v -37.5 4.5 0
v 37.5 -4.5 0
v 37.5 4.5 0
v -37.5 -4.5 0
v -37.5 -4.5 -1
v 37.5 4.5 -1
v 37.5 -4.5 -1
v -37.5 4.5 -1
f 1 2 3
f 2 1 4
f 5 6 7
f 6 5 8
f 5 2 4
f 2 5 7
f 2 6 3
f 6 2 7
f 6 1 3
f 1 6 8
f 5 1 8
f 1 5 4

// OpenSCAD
// Pip-Boy lettering

union() {
  translate([0, 0,-0.5])
    cube([75.0,9,1.0], center=true);
  translate([0,0,-0.1])
        scale([.14, .14, 0.01])
          surface(file = "pip-boy_letters.png", center=true, invert=false);
}
